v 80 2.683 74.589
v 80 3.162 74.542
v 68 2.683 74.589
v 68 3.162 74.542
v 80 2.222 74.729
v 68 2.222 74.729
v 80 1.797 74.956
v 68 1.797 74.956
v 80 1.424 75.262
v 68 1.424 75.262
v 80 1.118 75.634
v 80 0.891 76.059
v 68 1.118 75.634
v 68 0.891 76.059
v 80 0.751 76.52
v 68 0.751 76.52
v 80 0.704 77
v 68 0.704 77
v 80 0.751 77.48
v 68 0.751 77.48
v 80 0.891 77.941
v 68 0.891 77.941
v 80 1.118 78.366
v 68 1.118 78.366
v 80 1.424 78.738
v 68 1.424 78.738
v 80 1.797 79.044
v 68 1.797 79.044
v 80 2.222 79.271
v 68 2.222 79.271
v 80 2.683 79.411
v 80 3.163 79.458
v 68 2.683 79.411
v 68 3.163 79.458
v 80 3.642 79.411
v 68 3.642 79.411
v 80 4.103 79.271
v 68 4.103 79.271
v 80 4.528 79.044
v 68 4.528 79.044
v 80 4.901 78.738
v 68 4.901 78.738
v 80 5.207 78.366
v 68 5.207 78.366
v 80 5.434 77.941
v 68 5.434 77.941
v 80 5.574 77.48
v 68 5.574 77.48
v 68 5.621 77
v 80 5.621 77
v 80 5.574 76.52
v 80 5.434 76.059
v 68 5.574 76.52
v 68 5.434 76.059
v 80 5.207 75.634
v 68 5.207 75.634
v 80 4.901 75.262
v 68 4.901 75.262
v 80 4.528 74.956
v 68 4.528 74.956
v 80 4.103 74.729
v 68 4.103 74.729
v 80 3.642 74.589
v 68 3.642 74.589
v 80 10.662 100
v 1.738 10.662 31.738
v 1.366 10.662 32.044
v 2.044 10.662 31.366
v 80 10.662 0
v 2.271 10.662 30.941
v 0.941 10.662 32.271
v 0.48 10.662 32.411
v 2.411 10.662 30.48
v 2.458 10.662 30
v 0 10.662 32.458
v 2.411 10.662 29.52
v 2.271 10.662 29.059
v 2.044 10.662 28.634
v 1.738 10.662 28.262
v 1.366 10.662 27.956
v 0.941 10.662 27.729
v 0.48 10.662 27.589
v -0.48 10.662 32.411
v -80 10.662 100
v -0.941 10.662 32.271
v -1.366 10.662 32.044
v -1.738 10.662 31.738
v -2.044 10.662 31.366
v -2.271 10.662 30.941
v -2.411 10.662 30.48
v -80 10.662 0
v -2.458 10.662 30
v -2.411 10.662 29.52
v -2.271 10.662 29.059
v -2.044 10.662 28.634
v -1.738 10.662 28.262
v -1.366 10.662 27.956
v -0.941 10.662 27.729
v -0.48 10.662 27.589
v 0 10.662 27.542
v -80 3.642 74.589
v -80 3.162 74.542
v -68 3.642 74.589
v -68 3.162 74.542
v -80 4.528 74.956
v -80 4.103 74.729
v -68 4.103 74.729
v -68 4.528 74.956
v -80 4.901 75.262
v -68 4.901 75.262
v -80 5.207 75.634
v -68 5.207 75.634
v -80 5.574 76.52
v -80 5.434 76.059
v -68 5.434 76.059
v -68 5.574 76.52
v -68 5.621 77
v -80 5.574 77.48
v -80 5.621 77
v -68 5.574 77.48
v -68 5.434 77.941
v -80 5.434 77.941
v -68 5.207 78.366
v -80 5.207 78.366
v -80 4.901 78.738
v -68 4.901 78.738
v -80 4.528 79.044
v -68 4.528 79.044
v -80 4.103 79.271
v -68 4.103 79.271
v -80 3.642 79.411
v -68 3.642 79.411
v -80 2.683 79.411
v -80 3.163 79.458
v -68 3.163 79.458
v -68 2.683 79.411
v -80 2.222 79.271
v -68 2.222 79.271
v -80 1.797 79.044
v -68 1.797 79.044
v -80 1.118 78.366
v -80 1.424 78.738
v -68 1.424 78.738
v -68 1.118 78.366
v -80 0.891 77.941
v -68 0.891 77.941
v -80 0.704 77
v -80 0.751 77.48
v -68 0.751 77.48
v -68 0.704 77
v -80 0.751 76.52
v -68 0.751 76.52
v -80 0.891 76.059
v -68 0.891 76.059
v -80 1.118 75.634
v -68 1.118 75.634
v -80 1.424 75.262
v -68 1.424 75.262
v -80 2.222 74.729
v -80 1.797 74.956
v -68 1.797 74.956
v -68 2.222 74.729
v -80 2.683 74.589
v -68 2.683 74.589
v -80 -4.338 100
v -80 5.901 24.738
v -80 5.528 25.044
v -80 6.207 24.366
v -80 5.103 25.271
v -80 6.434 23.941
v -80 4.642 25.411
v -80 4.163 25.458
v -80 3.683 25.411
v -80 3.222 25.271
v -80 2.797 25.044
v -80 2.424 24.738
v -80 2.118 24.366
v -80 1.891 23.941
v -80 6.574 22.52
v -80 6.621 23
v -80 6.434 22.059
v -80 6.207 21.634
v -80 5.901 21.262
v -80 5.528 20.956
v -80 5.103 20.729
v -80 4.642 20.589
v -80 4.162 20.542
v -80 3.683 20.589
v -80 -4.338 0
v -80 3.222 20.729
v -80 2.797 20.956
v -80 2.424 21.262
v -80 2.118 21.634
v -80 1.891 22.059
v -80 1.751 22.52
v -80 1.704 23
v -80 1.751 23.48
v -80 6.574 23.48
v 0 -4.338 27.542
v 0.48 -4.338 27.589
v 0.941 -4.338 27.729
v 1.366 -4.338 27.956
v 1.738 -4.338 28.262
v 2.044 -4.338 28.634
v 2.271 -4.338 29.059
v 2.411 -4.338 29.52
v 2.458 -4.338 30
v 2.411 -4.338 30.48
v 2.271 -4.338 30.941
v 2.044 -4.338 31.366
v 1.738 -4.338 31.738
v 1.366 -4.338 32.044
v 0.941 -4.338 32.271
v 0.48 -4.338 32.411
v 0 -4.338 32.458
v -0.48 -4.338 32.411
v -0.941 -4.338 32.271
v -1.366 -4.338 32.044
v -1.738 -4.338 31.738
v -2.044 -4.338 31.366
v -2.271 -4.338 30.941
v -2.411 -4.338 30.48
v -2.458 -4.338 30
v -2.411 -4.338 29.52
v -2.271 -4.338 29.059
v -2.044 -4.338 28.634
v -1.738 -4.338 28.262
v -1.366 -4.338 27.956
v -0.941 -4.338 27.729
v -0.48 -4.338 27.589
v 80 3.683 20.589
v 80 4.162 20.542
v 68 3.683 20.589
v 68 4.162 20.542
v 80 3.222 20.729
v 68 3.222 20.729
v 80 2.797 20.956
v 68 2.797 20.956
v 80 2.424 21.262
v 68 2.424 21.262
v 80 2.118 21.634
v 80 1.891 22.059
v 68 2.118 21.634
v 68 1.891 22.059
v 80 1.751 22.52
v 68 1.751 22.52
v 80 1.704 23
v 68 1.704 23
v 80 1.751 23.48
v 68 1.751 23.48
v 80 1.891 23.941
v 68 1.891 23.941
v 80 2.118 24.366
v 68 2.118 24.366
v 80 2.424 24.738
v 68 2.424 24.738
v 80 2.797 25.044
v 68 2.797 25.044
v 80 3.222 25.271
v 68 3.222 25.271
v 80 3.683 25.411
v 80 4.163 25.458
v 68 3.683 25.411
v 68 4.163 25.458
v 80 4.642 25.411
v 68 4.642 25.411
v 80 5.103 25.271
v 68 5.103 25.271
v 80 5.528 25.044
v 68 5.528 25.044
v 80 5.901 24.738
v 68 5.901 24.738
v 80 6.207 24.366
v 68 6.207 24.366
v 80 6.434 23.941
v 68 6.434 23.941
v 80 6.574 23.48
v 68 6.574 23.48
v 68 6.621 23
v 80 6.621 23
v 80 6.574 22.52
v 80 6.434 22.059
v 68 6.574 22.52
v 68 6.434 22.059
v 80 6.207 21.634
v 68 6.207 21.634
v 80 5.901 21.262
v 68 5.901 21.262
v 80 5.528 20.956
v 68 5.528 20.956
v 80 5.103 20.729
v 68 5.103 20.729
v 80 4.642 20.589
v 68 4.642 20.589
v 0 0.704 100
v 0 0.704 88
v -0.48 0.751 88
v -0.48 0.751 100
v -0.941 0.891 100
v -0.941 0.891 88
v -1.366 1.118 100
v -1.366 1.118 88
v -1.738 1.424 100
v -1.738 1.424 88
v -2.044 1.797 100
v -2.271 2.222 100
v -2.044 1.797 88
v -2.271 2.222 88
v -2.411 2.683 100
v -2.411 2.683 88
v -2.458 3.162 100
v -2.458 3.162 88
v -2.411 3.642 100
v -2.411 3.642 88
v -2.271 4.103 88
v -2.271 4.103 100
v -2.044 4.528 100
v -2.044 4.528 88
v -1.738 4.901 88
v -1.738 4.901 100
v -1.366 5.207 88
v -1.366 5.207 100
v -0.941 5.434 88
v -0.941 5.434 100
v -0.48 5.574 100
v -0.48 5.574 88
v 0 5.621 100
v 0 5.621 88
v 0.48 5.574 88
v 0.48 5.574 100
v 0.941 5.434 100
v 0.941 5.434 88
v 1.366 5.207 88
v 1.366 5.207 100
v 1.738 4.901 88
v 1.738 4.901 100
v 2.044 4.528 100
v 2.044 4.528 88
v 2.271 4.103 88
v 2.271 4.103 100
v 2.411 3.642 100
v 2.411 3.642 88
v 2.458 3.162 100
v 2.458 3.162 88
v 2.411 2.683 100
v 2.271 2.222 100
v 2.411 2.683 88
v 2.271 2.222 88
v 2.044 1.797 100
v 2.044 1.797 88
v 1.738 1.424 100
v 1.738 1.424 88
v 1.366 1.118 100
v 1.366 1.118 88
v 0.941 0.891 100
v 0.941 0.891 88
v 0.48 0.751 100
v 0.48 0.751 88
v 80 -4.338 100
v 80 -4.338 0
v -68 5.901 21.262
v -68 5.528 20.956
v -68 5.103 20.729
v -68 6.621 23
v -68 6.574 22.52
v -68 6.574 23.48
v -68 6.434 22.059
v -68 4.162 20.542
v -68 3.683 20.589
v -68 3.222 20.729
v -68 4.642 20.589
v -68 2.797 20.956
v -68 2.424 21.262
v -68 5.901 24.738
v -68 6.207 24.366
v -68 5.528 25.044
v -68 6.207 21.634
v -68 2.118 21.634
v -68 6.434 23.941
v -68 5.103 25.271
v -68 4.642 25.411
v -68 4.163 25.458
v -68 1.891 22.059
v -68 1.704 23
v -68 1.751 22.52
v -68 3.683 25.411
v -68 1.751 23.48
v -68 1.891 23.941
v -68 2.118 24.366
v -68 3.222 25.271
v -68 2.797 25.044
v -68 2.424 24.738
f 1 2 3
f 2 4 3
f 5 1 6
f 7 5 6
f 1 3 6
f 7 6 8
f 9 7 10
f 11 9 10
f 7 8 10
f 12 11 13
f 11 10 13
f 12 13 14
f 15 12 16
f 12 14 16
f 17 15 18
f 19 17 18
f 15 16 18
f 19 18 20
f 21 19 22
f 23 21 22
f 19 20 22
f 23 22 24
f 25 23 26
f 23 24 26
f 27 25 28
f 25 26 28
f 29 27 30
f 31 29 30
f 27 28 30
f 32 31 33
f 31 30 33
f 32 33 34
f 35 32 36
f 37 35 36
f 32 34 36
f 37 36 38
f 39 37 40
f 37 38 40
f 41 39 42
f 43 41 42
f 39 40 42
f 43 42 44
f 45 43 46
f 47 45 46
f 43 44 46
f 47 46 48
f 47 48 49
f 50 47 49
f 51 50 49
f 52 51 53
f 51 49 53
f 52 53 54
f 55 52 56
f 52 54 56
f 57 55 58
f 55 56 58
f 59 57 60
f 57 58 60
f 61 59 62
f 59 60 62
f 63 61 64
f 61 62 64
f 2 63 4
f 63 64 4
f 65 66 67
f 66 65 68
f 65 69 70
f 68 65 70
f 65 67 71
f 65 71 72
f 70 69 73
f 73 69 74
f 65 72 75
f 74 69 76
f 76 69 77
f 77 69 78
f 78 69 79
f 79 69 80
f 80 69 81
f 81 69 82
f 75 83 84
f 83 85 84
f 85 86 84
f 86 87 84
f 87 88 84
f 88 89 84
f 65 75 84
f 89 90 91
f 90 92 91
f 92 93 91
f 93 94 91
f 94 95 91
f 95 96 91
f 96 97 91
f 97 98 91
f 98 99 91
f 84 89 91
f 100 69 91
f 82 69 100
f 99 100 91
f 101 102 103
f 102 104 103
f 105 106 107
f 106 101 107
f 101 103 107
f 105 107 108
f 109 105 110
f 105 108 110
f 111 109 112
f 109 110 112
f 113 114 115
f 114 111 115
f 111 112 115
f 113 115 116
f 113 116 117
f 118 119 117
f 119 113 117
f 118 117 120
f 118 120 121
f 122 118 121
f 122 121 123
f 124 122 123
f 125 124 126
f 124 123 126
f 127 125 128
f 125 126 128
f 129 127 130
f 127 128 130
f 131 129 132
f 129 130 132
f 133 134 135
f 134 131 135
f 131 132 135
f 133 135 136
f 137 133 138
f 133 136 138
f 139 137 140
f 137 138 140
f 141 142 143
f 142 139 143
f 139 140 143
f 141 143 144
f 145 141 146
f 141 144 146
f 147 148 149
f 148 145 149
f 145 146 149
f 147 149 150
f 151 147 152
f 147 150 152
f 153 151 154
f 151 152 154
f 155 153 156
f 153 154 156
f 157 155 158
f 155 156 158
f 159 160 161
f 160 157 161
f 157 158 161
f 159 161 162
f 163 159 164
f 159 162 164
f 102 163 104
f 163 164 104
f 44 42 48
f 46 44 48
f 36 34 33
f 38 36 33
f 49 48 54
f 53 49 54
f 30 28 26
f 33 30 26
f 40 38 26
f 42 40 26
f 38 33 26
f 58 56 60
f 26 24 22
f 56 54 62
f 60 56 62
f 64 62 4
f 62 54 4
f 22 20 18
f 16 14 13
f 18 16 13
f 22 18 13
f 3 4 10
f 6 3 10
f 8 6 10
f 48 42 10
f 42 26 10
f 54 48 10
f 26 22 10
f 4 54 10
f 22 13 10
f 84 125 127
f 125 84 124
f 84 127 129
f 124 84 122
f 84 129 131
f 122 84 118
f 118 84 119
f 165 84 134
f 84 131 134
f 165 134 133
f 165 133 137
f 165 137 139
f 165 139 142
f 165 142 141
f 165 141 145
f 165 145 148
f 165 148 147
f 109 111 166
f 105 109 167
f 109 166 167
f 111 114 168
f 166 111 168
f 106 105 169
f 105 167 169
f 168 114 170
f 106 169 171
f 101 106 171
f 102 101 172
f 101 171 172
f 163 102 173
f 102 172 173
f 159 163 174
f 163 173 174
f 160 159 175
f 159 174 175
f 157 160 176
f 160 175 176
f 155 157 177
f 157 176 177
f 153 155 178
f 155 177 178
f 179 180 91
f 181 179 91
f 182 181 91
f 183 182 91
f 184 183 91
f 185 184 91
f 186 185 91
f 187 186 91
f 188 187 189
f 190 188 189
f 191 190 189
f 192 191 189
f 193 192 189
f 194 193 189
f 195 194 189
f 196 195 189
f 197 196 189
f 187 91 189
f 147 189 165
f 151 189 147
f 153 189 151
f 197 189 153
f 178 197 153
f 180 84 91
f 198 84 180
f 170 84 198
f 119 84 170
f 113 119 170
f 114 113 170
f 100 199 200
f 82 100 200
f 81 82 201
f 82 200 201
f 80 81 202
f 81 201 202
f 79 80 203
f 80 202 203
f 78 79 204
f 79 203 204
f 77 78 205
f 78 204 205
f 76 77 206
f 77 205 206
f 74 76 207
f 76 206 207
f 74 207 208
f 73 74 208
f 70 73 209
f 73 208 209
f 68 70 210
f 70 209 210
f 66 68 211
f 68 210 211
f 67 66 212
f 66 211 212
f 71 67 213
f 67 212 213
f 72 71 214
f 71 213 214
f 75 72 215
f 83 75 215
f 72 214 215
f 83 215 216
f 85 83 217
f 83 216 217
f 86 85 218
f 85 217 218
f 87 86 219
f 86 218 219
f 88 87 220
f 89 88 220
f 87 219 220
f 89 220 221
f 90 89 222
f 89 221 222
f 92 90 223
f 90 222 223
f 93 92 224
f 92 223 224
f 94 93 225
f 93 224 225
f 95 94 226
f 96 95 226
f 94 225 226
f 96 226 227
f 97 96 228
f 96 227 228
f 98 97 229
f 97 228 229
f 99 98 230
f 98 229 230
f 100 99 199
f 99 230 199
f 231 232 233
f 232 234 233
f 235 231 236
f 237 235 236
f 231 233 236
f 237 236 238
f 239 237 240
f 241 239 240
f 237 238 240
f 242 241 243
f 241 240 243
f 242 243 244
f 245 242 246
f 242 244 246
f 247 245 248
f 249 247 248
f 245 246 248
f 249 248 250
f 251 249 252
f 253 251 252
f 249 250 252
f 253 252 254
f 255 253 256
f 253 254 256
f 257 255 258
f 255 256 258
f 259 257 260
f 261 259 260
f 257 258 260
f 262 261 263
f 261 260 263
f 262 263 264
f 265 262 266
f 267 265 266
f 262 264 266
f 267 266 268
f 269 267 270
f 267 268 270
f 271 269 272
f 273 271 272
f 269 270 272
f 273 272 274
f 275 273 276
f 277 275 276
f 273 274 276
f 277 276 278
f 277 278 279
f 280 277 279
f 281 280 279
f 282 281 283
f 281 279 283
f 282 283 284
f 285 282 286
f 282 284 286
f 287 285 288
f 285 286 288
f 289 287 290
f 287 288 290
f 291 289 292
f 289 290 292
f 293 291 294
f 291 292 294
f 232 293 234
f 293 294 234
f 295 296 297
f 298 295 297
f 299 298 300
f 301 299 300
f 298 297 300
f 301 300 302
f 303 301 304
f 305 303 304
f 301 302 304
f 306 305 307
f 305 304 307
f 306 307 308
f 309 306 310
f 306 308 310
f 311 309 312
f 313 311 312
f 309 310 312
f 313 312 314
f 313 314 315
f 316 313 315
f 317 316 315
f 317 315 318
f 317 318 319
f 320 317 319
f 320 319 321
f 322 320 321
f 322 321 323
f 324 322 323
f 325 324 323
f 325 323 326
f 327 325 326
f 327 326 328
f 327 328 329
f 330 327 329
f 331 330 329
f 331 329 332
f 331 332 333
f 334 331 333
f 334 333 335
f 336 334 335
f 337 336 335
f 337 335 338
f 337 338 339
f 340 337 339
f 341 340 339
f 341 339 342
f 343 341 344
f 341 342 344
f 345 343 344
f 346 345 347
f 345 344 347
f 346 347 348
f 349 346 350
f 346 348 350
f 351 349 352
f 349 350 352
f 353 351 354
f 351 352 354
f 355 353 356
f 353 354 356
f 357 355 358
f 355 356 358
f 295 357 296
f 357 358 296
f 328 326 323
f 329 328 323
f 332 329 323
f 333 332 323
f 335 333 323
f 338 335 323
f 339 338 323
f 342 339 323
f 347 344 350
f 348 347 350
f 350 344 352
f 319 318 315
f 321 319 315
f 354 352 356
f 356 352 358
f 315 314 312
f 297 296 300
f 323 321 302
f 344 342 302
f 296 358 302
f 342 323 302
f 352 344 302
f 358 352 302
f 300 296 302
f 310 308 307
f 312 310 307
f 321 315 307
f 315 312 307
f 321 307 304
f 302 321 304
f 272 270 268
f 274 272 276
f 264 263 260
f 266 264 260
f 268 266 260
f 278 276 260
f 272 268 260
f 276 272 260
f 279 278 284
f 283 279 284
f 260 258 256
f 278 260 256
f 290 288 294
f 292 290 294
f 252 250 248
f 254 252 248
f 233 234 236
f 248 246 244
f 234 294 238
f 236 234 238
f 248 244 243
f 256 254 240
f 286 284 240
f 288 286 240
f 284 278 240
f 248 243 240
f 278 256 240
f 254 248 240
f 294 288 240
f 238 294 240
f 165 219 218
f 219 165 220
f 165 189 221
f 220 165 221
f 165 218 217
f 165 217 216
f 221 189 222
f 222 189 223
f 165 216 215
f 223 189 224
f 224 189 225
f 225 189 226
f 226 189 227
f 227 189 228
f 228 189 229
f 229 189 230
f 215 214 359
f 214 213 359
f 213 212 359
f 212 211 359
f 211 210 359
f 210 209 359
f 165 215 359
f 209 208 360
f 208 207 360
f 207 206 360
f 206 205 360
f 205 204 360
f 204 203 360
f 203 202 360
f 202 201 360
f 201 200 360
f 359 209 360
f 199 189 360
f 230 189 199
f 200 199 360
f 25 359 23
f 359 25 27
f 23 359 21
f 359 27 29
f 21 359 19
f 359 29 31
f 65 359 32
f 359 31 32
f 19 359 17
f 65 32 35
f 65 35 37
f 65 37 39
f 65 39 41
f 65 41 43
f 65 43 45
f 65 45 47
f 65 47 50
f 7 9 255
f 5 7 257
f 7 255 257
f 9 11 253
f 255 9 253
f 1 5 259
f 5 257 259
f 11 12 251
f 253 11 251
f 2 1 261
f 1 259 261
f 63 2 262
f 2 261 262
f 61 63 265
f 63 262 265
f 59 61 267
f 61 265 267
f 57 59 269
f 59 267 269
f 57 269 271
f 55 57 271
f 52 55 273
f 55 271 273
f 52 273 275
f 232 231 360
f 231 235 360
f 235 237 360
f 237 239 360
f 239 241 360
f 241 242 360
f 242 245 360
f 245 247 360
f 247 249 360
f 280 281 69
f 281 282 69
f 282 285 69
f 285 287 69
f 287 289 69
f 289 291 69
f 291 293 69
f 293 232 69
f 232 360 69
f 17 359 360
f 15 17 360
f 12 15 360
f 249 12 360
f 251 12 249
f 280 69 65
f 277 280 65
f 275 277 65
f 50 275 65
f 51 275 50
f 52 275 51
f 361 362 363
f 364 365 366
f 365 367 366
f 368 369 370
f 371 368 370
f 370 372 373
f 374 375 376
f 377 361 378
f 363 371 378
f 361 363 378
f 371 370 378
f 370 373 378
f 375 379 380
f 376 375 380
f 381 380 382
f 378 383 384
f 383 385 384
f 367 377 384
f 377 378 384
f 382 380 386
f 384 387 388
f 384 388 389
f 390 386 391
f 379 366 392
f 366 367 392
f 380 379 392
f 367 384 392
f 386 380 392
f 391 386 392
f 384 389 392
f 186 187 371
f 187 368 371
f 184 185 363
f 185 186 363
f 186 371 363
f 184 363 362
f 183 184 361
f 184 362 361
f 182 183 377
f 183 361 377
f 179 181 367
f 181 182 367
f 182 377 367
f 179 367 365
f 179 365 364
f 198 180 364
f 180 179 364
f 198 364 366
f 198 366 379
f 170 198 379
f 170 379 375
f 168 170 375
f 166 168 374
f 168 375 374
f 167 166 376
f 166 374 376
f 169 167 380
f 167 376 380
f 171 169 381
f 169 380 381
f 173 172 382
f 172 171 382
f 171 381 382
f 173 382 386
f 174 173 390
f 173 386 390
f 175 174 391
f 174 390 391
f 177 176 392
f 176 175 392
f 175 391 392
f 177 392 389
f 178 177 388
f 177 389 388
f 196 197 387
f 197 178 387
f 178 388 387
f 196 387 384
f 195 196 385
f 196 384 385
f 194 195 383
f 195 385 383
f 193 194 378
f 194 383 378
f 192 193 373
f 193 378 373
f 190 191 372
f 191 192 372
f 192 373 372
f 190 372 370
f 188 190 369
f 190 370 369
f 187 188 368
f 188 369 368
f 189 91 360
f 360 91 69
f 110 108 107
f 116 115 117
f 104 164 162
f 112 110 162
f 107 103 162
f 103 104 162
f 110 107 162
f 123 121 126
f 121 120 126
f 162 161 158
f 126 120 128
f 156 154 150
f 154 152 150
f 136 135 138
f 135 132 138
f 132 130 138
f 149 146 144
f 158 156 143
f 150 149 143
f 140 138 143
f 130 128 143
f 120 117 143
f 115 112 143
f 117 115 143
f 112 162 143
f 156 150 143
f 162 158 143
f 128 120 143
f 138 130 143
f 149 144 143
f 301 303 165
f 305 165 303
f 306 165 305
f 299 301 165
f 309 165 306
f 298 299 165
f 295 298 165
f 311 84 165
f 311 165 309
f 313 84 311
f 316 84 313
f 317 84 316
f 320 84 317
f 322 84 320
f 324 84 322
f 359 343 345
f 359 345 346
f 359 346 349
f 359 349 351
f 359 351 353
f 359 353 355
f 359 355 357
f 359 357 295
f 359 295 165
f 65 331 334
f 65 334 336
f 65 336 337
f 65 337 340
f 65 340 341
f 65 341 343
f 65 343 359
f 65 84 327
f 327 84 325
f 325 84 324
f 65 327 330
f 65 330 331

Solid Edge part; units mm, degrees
sketch "Sketch1" plane through (0, 0, 0) normal (0, 0, 1) x (1, 0, 0)
  line L0 (-80, -4.3375) -> (80, -4.3375)
  line L1 (80, -4.3375) -> (80, 10.6625)
  line L2 (80, 10.6625) -> (-80, 10.6625)
  line L3 (-80, 10.6625) -> (-80, -4.3375)
extrude "Protrusion1" add sketch "Sketch1" along normal blind 100
hole "Hole_1" at (0, -4.3375, 30) direction (0, 1, 0) diameter 4.917 end up to next thread major 6 thread length 2
hole "Hole_2" at (0, 3.1625, 100) direction (0, 0, -1) diameter 4.917 depth 12 thread major 6 thread length 2
hole "Hole_3" at (80, 3.1625, 77) direction (-1, 0, 0) diameter 4.917 depth 12 thread major 6 thread length 2
hole "Hole1" at (80, 4.1625, 23) direction (-1, 0, 0) diameter 4.917 depth 12 thread major 6 thread length 2
mirror "Mirror1" about plane through (0, 0, 0) normal (1, 0, 0) of "Hole_3", "Hole1"
